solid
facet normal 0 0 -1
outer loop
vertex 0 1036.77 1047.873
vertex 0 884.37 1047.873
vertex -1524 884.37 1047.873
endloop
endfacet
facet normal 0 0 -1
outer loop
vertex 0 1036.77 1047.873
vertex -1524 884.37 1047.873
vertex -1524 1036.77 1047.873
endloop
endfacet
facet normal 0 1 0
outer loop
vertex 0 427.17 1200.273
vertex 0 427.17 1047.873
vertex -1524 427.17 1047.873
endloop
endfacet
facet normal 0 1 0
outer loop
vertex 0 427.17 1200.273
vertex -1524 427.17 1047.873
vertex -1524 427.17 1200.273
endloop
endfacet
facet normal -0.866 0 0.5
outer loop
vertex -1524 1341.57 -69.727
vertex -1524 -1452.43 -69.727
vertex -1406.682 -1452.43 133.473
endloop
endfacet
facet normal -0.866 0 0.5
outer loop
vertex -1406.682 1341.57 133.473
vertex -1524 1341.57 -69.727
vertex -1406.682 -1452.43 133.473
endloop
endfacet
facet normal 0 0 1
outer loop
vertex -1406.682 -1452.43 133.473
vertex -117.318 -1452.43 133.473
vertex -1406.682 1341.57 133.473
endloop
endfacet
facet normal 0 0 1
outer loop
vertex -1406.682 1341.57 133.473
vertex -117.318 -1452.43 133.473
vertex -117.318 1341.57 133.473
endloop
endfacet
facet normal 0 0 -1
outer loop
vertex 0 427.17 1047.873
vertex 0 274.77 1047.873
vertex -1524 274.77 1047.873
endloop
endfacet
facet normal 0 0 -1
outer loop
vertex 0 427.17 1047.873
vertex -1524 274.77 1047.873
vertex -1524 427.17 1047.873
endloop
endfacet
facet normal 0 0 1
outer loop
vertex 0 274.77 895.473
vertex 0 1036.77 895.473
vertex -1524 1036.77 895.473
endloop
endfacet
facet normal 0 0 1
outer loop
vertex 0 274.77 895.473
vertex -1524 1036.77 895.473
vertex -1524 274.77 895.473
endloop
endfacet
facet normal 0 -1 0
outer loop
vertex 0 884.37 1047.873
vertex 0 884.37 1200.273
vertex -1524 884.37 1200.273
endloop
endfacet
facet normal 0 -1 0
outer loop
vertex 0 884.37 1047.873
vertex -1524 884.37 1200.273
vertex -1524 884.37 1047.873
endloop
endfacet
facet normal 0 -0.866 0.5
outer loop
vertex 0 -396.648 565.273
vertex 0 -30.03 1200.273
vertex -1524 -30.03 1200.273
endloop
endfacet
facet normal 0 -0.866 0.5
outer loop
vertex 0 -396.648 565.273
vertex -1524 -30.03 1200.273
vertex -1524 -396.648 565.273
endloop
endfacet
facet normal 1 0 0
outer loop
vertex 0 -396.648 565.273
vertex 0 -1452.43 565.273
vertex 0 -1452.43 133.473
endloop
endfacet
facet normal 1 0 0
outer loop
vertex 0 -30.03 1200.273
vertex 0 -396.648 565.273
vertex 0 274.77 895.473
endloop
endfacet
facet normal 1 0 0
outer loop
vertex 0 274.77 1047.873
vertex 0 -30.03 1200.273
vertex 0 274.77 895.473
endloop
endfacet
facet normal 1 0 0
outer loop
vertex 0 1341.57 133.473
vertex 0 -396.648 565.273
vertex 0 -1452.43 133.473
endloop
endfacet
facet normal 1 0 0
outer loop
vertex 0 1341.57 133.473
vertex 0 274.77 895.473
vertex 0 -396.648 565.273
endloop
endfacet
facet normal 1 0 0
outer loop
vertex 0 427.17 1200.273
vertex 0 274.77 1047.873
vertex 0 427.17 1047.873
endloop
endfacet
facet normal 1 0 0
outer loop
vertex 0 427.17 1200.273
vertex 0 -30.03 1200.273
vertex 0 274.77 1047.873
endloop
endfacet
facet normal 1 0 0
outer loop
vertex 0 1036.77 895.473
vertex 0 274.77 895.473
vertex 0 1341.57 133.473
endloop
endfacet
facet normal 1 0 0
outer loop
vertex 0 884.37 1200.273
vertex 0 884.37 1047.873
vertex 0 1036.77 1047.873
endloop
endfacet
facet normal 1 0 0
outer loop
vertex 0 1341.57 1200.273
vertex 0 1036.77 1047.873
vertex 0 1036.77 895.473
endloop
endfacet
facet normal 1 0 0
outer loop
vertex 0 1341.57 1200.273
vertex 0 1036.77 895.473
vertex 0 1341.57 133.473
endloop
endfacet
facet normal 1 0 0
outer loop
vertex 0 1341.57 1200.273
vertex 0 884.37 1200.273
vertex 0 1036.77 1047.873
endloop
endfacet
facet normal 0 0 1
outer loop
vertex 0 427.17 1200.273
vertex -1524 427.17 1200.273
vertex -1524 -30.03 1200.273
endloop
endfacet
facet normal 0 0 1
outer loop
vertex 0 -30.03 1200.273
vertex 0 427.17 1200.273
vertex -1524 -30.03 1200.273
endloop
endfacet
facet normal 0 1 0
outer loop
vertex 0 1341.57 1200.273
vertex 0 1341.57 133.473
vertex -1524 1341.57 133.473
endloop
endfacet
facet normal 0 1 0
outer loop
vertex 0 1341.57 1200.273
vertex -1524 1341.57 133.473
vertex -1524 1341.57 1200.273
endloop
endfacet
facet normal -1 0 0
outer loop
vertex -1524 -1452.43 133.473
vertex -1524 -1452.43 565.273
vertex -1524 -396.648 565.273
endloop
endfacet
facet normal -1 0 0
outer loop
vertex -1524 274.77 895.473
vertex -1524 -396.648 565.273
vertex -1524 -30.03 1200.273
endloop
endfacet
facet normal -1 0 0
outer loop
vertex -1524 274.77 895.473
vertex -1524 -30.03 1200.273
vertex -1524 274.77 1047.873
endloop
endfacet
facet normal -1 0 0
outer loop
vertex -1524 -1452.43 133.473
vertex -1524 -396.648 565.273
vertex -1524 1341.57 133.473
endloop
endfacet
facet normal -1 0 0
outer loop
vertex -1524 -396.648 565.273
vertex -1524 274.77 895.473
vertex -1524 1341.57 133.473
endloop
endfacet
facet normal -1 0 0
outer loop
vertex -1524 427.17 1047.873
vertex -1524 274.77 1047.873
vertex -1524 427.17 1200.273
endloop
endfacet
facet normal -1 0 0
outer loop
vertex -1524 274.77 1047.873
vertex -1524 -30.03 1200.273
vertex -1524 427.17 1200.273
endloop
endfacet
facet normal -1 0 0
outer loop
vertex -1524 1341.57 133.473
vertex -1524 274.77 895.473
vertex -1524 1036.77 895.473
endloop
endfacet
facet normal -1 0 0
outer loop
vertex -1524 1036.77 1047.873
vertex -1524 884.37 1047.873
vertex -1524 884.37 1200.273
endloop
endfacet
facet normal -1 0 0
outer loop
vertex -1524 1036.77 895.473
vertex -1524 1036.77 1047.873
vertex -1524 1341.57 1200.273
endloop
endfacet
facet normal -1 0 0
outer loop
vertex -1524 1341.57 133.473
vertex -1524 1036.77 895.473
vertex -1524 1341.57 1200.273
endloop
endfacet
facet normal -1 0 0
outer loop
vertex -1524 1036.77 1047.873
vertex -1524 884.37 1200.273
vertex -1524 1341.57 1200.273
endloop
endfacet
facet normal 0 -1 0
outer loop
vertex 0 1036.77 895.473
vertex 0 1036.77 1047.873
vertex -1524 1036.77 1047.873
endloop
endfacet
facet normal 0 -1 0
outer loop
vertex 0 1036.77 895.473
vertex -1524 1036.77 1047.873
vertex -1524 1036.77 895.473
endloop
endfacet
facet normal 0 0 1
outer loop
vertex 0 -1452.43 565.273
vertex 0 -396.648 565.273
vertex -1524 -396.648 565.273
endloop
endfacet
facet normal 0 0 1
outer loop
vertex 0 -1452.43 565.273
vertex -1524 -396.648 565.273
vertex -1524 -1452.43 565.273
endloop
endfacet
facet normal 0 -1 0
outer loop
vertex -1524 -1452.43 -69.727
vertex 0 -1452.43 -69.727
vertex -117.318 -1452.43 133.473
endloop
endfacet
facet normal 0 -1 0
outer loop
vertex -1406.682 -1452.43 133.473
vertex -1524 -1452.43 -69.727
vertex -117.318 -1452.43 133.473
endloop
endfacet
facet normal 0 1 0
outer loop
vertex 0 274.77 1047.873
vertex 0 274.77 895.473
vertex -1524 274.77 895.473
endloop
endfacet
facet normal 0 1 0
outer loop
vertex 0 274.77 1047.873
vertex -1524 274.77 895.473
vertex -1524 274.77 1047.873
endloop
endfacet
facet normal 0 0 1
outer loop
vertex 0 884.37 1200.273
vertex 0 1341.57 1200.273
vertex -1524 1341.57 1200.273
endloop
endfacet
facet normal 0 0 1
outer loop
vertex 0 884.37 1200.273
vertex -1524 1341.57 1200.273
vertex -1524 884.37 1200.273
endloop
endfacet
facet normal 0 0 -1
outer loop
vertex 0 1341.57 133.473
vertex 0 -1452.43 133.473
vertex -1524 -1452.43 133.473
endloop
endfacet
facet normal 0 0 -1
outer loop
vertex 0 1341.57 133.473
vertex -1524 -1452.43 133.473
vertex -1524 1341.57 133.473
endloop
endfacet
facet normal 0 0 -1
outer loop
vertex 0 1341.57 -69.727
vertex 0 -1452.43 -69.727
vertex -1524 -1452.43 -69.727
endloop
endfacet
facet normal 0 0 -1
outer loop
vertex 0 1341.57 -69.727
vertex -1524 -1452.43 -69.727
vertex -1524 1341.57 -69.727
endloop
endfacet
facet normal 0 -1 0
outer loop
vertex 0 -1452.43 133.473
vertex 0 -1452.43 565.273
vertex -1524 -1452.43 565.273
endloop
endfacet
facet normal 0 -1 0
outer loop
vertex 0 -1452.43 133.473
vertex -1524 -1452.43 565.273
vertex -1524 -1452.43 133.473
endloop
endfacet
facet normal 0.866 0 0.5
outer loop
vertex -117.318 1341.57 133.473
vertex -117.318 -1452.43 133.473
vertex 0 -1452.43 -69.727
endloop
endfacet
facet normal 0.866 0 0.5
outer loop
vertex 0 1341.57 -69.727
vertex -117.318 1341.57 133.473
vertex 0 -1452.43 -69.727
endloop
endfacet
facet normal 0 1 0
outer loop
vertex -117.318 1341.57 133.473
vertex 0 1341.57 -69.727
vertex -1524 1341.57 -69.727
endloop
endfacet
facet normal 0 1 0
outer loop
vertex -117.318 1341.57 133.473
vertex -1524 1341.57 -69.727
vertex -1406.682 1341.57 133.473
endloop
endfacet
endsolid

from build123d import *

# Parameters (mm, degrees)
F1_DEPTH = 1524
F0_W     = 2794
F0_H     = 203.2
F2_DEPTH = 1524
F4_DEPTH = 2794.001
F5_DEPTH = 2794.001


with BuildPart() as f1:
    # F0 (on Right) → F1 (new body)
    with BuildSketch(Plane.YZ):
        Polygon((-1452.4301245138, 565.2734136581), (-1452.4301245138, 133.4734136581), (1341.5698754862, 133.4734136581), (1341.5698754862, 1200.2734136581), (884.3698754862, 1200.2734136581), (884.3698754862, 1047.8734136581), (1036.7698754862, 1047.8734136581), (1036.7698754862, 895.4734136581), (274.7698754862, 895.4734136581), (274.7698754862, 1047.8734136581), (427.1698754862, 1047.8734136581), (427.1698754862, 1200.2734136581), (-30.0301245138, 1200.2734136581), (-396.6475454492, 565.2734136581), align=None)
    extrude(amount=-F1_DEPTH)


with BuildPart() as f2:
    # F0 (on Right) → F2 (new body)
    with BuildSketch(Plane.YZ):
        with Locations((-55.4301245138, 31.8734136581)):
            Rectangle(F0_W, F0_H)
    extrude(amount=-F2_DEPTH)

    # F3 (on face) → F4 (cut, through all)
    with BuildSketch(Plane.XZ.offset(1452.4301245138)):
        Polygon((-1524, 133.4734136581), (-1524, -69.7265863419), (-1406.6824253007, 133.4734136581), align=None)
    extrude(amount=-F4_DEPTH, mode=Mode.SUBTRACT)

    # F3 (on face) → F5 (cut, through all)
    with BuildSketch(Plane.XZ.offset(1452.4301245138)):
        Polygon((-117.3175746993, 133.4734136581), (0, -69.7265863419), (0, 133.4734136581), align=None)
    extrude(amount=-F5_DEPTH, mode=Mode.SUBTRACT)


solid = Compound([f1.part, f2.part])
